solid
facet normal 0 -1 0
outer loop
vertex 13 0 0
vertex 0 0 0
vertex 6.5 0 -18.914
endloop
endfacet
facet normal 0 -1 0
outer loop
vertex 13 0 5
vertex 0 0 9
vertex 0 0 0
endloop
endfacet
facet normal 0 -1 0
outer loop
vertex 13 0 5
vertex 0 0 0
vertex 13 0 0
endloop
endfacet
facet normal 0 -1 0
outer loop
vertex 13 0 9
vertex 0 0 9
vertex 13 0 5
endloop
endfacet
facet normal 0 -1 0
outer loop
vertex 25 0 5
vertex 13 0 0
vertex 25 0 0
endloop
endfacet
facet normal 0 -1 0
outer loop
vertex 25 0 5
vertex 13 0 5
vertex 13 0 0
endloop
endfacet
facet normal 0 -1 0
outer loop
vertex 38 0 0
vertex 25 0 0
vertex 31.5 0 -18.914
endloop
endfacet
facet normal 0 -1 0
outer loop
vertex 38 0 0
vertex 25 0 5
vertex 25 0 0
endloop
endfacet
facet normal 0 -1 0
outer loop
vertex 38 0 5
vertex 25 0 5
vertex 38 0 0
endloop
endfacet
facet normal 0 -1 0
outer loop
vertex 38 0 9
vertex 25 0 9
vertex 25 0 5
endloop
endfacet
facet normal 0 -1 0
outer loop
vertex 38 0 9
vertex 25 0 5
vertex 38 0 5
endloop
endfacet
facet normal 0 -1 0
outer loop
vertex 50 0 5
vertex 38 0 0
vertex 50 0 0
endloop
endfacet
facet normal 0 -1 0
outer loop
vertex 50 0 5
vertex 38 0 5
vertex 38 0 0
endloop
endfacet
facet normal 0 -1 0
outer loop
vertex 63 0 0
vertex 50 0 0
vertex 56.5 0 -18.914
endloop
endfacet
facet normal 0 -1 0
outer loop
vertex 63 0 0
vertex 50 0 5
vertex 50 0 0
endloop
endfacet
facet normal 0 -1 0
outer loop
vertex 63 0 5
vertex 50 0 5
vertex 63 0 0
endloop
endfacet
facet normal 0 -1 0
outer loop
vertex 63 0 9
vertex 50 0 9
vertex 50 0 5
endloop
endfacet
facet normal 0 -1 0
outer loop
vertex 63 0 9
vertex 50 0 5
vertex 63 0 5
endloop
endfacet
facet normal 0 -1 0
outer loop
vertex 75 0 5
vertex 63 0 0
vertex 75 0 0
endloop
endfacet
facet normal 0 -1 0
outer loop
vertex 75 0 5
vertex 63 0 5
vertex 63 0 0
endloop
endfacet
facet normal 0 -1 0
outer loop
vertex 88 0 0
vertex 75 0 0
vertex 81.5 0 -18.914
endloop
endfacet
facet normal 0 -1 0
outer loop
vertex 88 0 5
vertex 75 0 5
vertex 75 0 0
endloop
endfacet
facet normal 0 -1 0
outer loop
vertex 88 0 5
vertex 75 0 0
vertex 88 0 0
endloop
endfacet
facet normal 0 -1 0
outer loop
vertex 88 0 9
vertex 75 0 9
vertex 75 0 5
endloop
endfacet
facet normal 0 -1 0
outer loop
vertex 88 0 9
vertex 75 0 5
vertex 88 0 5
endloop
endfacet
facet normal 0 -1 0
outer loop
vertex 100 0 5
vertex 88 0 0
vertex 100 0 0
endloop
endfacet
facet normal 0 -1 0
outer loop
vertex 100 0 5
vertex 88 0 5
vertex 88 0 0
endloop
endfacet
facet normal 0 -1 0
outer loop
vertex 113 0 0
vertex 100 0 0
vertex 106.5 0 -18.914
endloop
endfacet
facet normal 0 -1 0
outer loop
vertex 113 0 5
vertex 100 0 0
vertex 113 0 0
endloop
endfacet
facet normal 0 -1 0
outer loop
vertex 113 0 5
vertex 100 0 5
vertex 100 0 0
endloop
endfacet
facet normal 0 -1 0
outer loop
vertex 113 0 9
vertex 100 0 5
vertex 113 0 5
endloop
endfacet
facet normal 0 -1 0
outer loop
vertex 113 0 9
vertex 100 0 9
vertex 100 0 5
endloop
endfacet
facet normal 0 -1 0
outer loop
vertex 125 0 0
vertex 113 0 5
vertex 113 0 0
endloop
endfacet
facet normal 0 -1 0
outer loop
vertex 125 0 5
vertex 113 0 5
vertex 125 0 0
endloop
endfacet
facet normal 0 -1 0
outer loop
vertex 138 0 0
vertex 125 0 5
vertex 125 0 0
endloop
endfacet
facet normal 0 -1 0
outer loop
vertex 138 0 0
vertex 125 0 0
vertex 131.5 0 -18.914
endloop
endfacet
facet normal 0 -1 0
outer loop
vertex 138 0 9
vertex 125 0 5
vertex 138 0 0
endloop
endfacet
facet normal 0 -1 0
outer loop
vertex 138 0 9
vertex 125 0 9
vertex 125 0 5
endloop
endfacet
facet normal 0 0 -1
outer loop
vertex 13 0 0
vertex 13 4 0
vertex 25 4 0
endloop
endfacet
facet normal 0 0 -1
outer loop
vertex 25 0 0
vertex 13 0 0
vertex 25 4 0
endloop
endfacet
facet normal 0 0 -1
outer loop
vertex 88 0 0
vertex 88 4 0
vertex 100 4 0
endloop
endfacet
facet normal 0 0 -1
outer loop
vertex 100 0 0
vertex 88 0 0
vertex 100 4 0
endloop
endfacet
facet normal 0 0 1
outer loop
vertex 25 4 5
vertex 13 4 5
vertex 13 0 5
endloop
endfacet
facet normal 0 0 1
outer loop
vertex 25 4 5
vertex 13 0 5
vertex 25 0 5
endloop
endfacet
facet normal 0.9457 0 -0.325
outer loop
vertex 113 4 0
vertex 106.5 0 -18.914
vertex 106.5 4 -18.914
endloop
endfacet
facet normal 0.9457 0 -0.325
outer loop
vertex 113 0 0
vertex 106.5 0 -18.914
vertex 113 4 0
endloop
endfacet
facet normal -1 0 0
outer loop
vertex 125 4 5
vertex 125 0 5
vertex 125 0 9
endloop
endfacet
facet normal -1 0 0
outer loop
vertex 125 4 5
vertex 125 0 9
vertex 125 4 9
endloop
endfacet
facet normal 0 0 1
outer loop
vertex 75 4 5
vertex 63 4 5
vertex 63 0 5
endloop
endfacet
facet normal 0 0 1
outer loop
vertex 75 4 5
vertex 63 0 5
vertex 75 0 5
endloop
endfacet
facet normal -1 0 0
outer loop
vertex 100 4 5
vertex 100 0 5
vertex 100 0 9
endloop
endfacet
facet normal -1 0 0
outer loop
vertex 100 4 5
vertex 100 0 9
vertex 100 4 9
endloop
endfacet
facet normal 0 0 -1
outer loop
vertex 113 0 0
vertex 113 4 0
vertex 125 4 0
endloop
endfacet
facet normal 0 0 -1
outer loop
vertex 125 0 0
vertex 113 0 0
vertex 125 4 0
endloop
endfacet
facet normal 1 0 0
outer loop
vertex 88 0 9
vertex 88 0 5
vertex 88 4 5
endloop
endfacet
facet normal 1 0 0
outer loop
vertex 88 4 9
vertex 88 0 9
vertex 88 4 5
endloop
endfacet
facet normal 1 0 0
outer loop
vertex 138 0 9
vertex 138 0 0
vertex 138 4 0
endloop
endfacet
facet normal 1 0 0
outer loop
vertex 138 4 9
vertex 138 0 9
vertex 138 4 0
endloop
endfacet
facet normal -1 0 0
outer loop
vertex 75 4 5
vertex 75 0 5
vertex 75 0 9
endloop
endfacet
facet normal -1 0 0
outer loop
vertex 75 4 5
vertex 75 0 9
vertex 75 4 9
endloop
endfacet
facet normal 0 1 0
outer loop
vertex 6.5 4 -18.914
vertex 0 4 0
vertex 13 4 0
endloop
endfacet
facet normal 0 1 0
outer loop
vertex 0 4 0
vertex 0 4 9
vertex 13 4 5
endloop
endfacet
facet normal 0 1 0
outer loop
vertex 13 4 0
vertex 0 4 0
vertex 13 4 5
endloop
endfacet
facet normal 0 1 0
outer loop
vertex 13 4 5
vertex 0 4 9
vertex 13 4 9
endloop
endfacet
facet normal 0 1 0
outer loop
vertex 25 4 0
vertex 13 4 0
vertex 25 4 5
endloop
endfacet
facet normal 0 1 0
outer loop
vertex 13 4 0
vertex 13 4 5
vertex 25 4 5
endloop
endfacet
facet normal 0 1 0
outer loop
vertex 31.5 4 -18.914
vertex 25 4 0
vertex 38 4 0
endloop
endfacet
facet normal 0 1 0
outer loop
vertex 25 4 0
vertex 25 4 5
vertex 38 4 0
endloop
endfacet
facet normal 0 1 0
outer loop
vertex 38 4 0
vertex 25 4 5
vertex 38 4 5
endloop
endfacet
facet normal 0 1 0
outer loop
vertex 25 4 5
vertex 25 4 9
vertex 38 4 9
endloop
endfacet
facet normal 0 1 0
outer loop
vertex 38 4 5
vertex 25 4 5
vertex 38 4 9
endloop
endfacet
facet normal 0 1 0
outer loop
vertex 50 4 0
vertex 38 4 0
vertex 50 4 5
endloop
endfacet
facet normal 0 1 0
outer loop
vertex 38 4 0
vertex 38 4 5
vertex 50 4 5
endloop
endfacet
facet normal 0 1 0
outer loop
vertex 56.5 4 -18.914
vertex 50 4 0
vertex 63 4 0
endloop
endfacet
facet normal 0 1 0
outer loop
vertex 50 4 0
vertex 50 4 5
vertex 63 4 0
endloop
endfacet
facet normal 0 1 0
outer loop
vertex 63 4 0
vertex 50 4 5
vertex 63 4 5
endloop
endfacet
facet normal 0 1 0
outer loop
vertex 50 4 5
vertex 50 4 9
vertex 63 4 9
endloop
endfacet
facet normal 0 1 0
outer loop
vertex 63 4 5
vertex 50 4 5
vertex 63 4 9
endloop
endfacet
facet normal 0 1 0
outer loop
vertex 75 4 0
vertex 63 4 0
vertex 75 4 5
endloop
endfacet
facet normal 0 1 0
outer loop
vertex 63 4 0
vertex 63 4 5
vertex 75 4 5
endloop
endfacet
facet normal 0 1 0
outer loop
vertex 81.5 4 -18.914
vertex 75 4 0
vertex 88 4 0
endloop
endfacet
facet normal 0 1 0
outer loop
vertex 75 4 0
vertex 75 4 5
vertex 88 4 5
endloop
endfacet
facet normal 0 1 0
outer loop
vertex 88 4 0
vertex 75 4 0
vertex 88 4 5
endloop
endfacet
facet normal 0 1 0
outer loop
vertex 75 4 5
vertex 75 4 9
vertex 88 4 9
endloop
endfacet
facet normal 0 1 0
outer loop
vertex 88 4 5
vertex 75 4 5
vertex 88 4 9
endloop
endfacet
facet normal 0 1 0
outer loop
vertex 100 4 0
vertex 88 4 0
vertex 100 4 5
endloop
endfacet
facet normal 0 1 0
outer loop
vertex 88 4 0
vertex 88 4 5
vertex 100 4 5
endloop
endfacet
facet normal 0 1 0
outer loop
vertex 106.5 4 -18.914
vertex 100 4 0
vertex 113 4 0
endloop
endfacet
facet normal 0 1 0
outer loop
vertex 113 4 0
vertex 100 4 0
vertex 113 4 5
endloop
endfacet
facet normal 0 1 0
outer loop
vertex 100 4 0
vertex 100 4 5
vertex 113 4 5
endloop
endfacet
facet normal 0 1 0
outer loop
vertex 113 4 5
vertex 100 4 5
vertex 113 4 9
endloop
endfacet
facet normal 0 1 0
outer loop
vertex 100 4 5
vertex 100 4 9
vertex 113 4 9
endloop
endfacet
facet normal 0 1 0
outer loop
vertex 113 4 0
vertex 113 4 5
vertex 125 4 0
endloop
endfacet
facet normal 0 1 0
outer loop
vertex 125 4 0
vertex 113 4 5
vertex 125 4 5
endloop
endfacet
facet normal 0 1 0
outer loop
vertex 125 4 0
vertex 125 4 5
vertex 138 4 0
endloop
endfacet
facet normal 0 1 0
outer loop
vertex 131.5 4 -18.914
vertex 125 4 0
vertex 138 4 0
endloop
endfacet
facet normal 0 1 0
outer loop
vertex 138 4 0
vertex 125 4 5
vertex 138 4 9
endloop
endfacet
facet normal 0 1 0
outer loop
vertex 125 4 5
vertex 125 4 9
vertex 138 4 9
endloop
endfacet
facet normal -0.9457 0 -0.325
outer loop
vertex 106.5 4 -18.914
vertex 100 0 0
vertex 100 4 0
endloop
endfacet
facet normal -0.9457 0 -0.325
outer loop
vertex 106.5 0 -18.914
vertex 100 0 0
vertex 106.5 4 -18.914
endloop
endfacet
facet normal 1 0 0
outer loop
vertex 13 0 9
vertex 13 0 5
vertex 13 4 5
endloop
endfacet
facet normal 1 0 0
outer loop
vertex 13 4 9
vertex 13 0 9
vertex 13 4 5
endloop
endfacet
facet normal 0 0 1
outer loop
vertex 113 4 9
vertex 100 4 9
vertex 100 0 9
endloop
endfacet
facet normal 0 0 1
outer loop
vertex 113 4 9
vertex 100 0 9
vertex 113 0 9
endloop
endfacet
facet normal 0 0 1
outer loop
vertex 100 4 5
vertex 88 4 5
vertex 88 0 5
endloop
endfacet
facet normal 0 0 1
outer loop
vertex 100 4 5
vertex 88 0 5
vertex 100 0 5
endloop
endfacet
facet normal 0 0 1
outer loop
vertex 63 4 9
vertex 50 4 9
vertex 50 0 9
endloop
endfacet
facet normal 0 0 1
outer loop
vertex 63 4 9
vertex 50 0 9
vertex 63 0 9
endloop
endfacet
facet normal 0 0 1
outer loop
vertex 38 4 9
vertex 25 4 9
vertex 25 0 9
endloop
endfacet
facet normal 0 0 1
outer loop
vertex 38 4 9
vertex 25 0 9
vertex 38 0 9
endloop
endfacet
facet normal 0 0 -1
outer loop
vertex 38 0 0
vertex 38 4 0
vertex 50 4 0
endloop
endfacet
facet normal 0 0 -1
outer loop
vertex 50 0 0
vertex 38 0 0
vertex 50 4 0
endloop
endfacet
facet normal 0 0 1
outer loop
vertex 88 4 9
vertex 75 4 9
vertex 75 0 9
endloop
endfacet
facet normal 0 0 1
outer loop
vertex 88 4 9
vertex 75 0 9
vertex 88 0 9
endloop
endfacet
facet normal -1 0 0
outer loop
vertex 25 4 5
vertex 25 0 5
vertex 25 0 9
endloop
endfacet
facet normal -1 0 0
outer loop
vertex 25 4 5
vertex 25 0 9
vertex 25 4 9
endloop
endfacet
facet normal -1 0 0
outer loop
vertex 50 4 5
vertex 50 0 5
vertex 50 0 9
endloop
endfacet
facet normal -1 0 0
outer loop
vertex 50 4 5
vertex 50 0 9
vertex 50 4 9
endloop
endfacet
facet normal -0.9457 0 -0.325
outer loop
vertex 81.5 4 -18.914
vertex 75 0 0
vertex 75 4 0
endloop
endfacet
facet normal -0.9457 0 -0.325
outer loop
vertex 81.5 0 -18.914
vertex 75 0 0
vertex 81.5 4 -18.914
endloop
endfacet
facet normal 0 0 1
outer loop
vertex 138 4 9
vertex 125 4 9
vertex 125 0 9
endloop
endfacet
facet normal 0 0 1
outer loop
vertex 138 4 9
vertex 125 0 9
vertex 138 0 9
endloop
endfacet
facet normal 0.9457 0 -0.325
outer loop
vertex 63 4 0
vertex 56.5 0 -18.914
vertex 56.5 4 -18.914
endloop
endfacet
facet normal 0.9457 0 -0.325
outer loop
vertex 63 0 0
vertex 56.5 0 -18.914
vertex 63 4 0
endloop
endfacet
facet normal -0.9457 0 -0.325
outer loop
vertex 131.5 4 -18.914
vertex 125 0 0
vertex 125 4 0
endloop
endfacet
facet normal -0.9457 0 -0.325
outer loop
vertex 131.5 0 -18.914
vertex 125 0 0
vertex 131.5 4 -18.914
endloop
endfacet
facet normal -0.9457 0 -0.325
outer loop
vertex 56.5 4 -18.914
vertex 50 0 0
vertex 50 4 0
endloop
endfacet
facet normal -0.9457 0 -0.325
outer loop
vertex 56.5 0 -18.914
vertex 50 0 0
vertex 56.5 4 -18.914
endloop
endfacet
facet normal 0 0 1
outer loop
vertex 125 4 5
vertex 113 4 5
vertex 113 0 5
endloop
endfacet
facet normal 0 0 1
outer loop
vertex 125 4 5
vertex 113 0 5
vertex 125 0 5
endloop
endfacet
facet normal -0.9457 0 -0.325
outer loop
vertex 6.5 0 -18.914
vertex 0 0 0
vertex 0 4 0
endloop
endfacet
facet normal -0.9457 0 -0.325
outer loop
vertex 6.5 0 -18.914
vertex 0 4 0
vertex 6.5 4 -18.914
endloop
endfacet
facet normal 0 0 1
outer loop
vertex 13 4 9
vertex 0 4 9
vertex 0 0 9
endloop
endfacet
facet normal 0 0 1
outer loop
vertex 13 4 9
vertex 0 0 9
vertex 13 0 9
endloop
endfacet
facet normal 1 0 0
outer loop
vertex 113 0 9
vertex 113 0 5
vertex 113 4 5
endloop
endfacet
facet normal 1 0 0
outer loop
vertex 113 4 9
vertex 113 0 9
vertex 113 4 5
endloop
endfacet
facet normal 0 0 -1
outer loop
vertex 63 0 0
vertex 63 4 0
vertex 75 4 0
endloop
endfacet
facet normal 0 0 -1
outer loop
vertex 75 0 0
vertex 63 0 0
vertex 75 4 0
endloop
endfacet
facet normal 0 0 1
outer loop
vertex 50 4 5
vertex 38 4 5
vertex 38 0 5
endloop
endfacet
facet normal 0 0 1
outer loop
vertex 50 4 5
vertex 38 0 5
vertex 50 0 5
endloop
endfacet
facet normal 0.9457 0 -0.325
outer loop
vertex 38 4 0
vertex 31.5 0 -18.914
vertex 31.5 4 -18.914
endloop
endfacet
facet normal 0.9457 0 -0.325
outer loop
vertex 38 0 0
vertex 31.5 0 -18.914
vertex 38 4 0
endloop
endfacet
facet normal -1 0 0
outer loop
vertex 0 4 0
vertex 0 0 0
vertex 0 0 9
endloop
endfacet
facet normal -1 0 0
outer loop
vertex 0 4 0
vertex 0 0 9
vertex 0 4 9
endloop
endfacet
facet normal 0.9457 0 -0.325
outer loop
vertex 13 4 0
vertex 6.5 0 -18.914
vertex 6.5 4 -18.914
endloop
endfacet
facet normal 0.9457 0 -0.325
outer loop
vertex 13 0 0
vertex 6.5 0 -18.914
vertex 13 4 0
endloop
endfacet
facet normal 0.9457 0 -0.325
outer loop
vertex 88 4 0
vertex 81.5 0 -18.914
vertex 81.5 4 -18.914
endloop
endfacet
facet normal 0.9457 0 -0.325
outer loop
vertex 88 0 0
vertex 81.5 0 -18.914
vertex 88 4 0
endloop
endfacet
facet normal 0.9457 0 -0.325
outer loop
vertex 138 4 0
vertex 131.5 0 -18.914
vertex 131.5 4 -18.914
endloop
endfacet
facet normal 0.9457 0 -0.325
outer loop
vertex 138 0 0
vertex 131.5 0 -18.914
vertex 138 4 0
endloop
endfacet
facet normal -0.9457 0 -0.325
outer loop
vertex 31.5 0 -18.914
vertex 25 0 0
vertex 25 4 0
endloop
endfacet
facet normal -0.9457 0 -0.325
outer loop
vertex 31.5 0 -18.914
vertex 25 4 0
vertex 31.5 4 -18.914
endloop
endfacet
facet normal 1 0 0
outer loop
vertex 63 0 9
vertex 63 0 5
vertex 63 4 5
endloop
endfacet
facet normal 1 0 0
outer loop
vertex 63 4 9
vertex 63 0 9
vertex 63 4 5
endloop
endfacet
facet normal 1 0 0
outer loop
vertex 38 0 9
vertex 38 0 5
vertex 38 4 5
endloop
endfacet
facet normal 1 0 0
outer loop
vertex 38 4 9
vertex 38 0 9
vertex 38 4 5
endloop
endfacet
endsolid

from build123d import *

# Parameters (mm, degrees)
F0_W     = 13
F0_H     = 4
F0_W_2   = 12
F1_DEPTH = 5
F2_DEPTH = 9
F4_DEPTH = 4


with BuildPart() as f1:
    # F0 (on Top) → F1 (new body)
    with BuildSketch(Plane.XY):
        with Locations((6.5, 2)):
            Rectangle(F0_W, F0_H)
        with Locations((19, 2)):
            Rectangle(F0_W_2, F0_H)
        with Locations((31.5, 2)):
            Rectangle(F0_W, F0_H)
        with Locations((44, 2)):
            Rectangle(F0_W_2, F0_H)
        with Locations((56.5, 2)):
            Rectangle(F0_W, F0_H)
        with Locations((69, 2)):
            Rectangle(F0_W_2, F0_H)
        with Locations((81.5, 2)):
            Rectangle(F0_W, F0_H)
        with Locations((94, 2)):
            Rectangle(F0_W_2, F0_H)
        with Locations((106.5, 2)):
            Rectangle(F0_W, F0_H)
        with Locations((119, 2)):
            Rectangle(F0_W_2, F0_H)
        with Locations((131.5, 2)):
            Rectangle(F0_W, F0_H)
    extrude(amount=F1_DEPTH)

    # F0 (on Top) → F2 (join)
    with BuildSketch(Plane.XY):
        with Locations((6.5, 2)):
            Rectangle(F0_W, F0_H)
        with Locations((31.5, 2)):
            Rectangle(F0_W, F0_H)
        with Locations((56.5, 2)):
            Rectangle(F0_W, F0_H)
        with Locations((81.5, 2)):
            Rectangle(F0_W, F0_H)
        with Locations((106.5, 2)):
            Rectangle(F0_W, F0_H)
        with Locations((131.5, 2)):
            Rectangle(F0_W, F0_H)
    extrude(amount=F2_DEPTH)

    # F3 (on face) → F4 (join)
    with BuildSketch(Plane.XZ):
        Polygon((13, 0), (0, 0), (6.5, -18.91428), align=None)
        Polygon((38, 0), (25, 0), (31.5, -18.91428), align=None)
        Polygon((63, 0), (50, 0), (56.5, -18.91428), align=None)
        Polygon((88, 0), (75, 0), (81.5, -18.91428), align=None)
        Polygon((113, 0), (100, 0), (106.5, -18.91428), align=None)
        Polygon((138, 0), (125, 0), (131.5, -18.91428), align=None)
    extrude(amount=-F4_DEPTH)


solid = f1.part
